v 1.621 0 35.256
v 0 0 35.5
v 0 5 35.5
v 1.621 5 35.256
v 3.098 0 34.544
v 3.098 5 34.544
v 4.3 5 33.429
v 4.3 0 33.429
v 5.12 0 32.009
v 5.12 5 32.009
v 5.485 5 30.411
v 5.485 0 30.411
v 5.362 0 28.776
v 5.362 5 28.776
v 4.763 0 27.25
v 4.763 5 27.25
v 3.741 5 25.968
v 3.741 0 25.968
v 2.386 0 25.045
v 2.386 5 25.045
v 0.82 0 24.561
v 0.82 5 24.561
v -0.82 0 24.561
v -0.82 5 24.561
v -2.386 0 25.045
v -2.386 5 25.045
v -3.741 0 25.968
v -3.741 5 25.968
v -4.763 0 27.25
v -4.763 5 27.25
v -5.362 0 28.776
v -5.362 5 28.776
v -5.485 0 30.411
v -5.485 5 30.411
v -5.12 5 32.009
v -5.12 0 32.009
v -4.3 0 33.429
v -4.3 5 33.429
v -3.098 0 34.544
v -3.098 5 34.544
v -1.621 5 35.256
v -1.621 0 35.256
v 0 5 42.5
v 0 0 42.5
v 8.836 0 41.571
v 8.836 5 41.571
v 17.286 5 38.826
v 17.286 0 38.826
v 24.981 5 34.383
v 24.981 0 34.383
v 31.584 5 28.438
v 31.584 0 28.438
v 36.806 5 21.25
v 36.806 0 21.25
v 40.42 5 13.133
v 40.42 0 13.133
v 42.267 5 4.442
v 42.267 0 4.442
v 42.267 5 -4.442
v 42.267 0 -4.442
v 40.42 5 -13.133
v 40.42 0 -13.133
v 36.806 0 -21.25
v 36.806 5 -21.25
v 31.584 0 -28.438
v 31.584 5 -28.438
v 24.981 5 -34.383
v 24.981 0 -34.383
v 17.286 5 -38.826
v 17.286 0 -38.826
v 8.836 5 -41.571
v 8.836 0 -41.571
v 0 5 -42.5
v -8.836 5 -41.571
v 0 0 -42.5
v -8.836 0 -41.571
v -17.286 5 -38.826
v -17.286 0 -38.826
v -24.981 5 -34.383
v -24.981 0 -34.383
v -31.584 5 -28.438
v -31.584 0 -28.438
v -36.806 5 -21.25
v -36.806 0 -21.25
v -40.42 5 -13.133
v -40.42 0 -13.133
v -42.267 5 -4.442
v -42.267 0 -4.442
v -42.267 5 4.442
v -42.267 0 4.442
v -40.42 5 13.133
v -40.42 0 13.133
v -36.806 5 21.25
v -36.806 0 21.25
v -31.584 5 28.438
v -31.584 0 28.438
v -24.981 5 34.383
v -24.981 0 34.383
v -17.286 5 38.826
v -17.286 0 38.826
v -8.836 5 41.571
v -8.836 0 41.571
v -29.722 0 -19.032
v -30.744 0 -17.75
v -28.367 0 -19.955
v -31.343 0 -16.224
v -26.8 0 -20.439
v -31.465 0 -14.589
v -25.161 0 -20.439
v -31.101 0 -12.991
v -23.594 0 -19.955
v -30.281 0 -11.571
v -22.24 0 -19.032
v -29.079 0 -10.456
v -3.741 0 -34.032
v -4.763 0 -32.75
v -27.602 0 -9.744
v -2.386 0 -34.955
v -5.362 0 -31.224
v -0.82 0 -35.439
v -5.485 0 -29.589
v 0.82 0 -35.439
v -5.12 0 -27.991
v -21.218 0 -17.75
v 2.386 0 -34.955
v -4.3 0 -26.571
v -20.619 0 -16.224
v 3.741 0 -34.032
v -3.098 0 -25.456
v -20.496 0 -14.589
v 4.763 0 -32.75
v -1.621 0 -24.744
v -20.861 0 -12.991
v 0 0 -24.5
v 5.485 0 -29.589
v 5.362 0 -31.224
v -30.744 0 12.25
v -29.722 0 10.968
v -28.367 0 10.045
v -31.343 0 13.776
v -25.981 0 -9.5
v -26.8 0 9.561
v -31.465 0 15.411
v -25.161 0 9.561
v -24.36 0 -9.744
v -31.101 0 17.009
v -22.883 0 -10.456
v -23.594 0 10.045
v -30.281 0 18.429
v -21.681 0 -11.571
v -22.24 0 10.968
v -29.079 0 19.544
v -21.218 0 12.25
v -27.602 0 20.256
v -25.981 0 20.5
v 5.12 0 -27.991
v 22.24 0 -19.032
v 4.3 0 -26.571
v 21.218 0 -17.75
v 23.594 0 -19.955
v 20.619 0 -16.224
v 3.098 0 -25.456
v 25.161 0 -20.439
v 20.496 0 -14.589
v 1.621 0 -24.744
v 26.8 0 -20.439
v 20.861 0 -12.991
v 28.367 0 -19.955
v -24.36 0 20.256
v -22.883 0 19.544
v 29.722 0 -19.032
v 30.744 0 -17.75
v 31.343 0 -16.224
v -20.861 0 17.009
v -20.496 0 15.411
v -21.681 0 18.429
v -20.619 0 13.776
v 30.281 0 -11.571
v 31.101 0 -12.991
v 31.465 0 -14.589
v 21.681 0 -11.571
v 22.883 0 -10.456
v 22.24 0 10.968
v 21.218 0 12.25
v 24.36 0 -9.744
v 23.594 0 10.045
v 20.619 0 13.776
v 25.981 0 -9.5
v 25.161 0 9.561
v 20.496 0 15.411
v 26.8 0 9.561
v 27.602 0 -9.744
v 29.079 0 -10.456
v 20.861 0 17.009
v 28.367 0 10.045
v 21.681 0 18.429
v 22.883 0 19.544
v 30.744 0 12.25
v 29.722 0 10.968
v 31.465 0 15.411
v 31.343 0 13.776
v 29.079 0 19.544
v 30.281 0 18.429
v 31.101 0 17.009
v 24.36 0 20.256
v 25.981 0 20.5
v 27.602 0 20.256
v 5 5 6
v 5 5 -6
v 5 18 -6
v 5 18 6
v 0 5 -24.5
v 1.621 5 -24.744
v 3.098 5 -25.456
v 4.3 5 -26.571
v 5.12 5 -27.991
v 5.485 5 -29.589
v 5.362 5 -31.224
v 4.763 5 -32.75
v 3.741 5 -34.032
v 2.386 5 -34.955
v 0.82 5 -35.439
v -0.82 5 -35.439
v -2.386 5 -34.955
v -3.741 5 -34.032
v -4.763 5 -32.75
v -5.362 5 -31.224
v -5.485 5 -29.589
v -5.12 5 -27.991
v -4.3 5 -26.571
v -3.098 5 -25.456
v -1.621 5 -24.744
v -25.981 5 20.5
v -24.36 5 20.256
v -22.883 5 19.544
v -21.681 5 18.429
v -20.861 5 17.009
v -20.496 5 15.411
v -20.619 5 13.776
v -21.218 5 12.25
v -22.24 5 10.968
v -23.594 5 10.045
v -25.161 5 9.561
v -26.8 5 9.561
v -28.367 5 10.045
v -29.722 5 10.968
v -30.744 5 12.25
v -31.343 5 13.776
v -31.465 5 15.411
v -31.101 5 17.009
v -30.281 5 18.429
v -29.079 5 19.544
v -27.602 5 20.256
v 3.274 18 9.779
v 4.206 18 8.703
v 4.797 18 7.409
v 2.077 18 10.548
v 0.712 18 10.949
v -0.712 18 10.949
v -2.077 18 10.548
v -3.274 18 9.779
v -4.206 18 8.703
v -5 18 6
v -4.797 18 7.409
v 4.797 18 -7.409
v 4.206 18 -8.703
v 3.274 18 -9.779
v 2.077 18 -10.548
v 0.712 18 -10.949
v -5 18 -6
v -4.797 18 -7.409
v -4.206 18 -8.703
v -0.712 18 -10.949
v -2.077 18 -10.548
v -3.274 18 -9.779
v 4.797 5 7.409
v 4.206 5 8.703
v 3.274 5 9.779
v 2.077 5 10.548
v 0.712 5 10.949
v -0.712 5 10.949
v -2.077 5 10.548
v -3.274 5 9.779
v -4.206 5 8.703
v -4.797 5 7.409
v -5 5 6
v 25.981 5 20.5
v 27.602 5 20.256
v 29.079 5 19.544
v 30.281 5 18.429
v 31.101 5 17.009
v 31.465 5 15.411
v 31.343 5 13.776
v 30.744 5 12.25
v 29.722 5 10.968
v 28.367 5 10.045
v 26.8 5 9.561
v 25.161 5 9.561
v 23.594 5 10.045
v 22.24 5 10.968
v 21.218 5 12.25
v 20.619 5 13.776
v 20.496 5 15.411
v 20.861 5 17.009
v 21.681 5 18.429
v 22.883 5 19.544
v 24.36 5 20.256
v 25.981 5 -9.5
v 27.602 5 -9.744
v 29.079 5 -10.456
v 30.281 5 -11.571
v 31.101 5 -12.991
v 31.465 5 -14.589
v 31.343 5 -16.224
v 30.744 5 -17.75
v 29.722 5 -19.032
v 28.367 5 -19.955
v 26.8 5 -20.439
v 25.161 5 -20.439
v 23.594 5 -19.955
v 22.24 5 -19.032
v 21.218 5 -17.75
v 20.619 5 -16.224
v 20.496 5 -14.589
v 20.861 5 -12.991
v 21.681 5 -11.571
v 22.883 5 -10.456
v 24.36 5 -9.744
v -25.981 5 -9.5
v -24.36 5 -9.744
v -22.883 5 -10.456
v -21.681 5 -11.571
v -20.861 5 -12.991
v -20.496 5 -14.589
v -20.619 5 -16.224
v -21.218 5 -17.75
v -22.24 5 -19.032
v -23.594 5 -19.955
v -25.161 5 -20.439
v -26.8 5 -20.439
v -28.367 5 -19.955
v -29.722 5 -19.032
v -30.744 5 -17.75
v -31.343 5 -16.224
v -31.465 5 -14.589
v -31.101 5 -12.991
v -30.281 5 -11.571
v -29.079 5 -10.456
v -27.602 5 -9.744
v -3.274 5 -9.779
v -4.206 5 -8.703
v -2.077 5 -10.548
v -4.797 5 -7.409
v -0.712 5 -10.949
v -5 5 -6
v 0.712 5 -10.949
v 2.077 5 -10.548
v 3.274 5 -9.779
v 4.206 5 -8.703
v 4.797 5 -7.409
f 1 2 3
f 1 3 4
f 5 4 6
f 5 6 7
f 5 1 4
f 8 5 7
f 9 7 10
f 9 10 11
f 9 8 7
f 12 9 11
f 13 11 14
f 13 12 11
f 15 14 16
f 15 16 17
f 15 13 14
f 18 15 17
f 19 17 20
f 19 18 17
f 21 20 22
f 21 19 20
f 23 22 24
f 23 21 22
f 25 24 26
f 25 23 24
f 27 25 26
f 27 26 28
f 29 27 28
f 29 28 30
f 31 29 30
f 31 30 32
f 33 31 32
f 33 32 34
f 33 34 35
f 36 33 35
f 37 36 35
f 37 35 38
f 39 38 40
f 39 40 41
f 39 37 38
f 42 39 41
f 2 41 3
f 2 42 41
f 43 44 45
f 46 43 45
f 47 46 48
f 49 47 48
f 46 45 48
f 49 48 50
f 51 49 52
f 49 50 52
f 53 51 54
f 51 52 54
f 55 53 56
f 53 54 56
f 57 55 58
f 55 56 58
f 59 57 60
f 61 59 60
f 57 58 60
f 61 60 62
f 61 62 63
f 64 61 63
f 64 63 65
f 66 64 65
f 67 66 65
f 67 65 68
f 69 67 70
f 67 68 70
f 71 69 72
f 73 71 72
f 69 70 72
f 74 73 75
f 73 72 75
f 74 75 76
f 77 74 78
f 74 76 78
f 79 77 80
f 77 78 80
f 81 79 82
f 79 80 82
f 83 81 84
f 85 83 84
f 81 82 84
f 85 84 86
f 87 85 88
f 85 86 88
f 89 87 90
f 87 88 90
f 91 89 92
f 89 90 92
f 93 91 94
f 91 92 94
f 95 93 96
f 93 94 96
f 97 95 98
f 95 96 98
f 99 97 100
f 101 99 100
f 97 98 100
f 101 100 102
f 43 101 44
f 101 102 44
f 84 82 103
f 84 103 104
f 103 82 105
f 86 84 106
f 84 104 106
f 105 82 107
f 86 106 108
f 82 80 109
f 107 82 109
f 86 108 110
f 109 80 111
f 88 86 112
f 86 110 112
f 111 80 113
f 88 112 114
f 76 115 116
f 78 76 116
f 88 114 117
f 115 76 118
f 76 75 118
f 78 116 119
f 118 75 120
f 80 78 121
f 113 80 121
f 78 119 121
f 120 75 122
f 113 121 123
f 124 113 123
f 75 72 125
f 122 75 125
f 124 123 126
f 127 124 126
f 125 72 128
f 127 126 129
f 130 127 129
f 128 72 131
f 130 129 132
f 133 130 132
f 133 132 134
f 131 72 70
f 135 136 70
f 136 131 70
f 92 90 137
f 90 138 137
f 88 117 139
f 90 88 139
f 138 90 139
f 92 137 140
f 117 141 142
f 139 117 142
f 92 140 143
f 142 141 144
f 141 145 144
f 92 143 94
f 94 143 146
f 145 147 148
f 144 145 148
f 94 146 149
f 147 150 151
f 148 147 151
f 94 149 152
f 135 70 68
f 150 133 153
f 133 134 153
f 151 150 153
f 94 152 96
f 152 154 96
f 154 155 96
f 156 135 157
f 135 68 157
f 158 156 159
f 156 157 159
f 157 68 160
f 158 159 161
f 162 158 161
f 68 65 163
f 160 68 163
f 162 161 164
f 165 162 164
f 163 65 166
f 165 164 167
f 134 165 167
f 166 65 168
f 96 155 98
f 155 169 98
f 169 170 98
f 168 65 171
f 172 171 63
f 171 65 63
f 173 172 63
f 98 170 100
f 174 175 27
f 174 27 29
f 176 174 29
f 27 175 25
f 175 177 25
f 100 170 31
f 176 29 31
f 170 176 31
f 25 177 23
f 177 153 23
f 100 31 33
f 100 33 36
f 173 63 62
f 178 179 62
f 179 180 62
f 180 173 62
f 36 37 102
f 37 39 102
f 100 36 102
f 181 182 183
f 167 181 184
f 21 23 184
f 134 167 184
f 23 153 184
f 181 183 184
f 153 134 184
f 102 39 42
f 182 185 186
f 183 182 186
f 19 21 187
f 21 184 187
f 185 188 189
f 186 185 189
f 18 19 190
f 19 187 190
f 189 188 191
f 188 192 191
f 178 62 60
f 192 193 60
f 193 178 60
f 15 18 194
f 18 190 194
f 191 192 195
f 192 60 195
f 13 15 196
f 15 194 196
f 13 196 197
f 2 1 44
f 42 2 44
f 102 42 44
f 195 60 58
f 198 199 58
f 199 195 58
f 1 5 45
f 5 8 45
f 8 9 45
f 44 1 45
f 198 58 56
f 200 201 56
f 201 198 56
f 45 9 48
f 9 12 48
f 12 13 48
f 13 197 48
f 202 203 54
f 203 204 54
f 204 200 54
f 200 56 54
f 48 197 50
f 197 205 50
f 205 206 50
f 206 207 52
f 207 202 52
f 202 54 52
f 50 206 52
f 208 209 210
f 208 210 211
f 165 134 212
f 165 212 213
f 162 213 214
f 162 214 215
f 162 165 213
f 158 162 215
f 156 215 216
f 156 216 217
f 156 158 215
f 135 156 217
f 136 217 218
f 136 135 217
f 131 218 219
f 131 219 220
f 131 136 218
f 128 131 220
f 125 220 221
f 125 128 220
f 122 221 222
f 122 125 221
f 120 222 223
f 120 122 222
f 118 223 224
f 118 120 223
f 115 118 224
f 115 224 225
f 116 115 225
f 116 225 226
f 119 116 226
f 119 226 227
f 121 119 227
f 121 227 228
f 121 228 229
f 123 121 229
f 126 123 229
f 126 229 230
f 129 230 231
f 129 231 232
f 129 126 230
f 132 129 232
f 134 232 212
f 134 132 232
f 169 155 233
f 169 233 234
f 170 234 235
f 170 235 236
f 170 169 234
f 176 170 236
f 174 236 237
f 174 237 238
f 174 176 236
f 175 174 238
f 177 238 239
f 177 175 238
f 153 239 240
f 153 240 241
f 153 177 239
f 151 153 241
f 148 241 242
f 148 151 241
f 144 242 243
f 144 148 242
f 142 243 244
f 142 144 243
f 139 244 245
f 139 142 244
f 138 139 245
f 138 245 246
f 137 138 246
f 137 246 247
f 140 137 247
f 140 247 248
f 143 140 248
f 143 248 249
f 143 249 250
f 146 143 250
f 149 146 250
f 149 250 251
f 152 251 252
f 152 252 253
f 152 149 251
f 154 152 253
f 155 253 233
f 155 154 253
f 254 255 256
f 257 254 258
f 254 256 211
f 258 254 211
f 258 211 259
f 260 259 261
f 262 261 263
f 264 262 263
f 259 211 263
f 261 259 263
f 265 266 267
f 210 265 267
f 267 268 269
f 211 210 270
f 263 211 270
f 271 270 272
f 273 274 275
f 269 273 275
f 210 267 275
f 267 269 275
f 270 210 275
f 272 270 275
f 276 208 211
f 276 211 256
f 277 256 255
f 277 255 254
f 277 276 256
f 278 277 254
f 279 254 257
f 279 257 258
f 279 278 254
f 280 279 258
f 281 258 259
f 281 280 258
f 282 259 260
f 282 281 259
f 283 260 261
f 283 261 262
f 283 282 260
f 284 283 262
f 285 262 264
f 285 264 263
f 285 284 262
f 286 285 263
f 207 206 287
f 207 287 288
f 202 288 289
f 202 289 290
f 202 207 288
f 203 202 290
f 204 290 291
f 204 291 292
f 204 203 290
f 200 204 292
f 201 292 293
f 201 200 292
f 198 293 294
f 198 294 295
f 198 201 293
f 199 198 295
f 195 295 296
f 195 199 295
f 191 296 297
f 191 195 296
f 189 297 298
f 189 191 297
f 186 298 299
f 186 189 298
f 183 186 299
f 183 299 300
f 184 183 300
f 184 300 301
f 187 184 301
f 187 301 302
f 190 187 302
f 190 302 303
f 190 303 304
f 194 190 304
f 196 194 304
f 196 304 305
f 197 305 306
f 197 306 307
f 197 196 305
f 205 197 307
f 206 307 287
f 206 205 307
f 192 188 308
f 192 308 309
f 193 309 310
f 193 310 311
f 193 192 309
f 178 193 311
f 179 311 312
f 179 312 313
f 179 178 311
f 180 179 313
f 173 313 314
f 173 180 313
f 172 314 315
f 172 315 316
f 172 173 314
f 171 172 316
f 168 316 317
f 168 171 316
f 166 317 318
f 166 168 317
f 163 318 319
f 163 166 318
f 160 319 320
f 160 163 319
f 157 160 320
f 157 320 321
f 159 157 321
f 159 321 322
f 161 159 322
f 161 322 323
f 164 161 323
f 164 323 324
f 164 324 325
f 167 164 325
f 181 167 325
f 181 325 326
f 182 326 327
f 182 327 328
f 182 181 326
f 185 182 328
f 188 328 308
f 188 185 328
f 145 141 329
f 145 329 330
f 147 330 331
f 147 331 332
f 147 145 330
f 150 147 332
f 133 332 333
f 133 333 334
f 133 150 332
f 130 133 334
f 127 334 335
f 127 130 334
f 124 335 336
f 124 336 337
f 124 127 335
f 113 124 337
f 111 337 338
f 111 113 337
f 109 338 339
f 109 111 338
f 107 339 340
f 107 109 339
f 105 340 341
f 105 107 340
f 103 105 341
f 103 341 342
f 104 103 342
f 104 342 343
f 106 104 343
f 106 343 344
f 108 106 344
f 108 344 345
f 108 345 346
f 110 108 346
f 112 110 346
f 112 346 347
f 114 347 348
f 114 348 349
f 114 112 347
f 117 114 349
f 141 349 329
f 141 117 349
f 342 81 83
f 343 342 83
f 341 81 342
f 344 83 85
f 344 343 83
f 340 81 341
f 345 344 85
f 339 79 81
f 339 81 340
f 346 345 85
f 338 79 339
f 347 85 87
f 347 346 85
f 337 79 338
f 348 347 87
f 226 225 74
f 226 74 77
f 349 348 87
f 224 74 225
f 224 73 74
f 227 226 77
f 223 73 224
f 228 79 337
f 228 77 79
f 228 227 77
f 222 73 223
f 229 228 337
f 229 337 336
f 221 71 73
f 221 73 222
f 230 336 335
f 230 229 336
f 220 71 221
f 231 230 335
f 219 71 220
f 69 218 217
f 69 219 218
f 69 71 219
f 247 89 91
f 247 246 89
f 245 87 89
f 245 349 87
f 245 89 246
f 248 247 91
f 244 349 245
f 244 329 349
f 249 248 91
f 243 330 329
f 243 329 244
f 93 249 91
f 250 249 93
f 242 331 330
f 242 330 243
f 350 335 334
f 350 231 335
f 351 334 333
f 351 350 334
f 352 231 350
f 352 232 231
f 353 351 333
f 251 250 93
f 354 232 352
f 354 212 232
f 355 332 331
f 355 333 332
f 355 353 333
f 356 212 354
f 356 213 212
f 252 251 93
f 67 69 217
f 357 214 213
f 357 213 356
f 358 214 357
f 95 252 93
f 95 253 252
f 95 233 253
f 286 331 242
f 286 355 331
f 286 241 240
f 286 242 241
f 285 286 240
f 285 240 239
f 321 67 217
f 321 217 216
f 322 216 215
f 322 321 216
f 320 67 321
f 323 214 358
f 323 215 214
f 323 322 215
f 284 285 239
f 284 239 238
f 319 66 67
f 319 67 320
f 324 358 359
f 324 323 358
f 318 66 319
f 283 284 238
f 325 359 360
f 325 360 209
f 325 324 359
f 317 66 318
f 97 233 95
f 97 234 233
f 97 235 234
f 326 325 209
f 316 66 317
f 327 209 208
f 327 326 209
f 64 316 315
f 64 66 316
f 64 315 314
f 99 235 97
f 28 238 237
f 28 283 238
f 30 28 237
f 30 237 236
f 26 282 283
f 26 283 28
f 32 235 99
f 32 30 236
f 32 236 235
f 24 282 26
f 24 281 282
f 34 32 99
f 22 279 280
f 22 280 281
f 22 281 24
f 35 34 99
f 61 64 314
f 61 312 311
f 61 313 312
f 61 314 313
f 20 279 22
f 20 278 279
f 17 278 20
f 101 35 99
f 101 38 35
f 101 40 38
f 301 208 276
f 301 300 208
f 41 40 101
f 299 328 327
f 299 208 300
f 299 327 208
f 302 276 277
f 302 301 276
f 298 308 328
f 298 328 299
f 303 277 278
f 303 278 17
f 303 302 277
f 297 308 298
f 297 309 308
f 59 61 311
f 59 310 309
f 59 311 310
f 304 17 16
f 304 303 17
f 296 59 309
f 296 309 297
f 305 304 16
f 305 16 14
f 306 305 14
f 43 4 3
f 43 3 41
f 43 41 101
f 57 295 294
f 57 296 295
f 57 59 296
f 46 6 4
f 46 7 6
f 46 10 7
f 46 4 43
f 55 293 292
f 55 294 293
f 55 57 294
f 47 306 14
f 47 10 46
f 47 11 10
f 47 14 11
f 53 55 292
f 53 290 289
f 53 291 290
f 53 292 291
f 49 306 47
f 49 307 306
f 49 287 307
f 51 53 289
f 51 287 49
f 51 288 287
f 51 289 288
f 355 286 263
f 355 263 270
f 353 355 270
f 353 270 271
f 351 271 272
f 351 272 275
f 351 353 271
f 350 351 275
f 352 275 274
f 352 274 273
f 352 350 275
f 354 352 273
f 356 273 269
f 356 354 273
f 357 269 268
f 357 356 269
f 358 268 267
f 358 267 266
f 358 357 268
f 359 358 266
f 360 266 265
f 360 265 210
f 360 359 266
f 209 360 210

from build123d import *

# Parameters (mm, degrees)
SKETCH1_R           = 42.5
SKETCH1_R_2         = 5.5
BOSS_EXTRUDE2_DEPTH = 5
BOSS_EXTRUDE3_DEPTH = 13


with BuildPart() as part:
    # Sketch1 → Boss-Extrude2 (new body)
    with BuildSketch(Plane(origin=(0, 0, 0), x_dir=(1, 0, 0), z_dir=(0, 1, 0))):
        with Locations(Location((0, 0, 0), (0, 0, 270))):
            Circle(SKETCH1_R)
        with Locations(Location((-25.980762114, 15, 0), (0, 0, 270))):
            Circle(SKETCH1_R_2, mode=Mode.SUBTRACT)
        with Locations(Location((0, 30, 0), (0, 0, 270))):
            Circle(SKETCH1_R_2, mode=Mode.SUBTRACT)
        with Locations(Location((25.980762114, 15, 0), (0, 0, 270))):
            Circle(SKETCH1_R_2, mode=Mode.SUBTRACT)
        with Locations(Location((25.980762114, -15, 0), (0, 0, 270))):
            Circle(SKETCH1_R_2, mode=Mode.SUBTRACT)
        with Locations(Location((0, -30, 0), (0, 0, 270))):
            Circle(SKETCH1_R_2, mode=Mode.SUBTRACT)
        with Locations(Location((-25.980762114, -15, 0), (0, 0, 270))):
            Circle(SKETCH1_R_2, mode=Mode.SUBTRACT)
    extrude(amount=BOSS_EXTRUDE2_DEPTH)

    # Sketch2 → Boss-Extrude3 (add)
    with BuildSketch(Plane(origin=(0, 5, 0), x_dir=(1, 0, 0), z_dir=(0, 1, 0))):
        with BuildLine():
            Line((-5, -6), (-5, 6))
            ThreePointArc((-5, 6), (0, 11), (5, 6))
            Line((5, 6), (5, -6))
            ThreePointArc((5, -6), (0, -11), (-5, -6))
        make_face()
    extrude(amount=BOSS_EXTRUDE3_DEPTH)


solid = part.part
